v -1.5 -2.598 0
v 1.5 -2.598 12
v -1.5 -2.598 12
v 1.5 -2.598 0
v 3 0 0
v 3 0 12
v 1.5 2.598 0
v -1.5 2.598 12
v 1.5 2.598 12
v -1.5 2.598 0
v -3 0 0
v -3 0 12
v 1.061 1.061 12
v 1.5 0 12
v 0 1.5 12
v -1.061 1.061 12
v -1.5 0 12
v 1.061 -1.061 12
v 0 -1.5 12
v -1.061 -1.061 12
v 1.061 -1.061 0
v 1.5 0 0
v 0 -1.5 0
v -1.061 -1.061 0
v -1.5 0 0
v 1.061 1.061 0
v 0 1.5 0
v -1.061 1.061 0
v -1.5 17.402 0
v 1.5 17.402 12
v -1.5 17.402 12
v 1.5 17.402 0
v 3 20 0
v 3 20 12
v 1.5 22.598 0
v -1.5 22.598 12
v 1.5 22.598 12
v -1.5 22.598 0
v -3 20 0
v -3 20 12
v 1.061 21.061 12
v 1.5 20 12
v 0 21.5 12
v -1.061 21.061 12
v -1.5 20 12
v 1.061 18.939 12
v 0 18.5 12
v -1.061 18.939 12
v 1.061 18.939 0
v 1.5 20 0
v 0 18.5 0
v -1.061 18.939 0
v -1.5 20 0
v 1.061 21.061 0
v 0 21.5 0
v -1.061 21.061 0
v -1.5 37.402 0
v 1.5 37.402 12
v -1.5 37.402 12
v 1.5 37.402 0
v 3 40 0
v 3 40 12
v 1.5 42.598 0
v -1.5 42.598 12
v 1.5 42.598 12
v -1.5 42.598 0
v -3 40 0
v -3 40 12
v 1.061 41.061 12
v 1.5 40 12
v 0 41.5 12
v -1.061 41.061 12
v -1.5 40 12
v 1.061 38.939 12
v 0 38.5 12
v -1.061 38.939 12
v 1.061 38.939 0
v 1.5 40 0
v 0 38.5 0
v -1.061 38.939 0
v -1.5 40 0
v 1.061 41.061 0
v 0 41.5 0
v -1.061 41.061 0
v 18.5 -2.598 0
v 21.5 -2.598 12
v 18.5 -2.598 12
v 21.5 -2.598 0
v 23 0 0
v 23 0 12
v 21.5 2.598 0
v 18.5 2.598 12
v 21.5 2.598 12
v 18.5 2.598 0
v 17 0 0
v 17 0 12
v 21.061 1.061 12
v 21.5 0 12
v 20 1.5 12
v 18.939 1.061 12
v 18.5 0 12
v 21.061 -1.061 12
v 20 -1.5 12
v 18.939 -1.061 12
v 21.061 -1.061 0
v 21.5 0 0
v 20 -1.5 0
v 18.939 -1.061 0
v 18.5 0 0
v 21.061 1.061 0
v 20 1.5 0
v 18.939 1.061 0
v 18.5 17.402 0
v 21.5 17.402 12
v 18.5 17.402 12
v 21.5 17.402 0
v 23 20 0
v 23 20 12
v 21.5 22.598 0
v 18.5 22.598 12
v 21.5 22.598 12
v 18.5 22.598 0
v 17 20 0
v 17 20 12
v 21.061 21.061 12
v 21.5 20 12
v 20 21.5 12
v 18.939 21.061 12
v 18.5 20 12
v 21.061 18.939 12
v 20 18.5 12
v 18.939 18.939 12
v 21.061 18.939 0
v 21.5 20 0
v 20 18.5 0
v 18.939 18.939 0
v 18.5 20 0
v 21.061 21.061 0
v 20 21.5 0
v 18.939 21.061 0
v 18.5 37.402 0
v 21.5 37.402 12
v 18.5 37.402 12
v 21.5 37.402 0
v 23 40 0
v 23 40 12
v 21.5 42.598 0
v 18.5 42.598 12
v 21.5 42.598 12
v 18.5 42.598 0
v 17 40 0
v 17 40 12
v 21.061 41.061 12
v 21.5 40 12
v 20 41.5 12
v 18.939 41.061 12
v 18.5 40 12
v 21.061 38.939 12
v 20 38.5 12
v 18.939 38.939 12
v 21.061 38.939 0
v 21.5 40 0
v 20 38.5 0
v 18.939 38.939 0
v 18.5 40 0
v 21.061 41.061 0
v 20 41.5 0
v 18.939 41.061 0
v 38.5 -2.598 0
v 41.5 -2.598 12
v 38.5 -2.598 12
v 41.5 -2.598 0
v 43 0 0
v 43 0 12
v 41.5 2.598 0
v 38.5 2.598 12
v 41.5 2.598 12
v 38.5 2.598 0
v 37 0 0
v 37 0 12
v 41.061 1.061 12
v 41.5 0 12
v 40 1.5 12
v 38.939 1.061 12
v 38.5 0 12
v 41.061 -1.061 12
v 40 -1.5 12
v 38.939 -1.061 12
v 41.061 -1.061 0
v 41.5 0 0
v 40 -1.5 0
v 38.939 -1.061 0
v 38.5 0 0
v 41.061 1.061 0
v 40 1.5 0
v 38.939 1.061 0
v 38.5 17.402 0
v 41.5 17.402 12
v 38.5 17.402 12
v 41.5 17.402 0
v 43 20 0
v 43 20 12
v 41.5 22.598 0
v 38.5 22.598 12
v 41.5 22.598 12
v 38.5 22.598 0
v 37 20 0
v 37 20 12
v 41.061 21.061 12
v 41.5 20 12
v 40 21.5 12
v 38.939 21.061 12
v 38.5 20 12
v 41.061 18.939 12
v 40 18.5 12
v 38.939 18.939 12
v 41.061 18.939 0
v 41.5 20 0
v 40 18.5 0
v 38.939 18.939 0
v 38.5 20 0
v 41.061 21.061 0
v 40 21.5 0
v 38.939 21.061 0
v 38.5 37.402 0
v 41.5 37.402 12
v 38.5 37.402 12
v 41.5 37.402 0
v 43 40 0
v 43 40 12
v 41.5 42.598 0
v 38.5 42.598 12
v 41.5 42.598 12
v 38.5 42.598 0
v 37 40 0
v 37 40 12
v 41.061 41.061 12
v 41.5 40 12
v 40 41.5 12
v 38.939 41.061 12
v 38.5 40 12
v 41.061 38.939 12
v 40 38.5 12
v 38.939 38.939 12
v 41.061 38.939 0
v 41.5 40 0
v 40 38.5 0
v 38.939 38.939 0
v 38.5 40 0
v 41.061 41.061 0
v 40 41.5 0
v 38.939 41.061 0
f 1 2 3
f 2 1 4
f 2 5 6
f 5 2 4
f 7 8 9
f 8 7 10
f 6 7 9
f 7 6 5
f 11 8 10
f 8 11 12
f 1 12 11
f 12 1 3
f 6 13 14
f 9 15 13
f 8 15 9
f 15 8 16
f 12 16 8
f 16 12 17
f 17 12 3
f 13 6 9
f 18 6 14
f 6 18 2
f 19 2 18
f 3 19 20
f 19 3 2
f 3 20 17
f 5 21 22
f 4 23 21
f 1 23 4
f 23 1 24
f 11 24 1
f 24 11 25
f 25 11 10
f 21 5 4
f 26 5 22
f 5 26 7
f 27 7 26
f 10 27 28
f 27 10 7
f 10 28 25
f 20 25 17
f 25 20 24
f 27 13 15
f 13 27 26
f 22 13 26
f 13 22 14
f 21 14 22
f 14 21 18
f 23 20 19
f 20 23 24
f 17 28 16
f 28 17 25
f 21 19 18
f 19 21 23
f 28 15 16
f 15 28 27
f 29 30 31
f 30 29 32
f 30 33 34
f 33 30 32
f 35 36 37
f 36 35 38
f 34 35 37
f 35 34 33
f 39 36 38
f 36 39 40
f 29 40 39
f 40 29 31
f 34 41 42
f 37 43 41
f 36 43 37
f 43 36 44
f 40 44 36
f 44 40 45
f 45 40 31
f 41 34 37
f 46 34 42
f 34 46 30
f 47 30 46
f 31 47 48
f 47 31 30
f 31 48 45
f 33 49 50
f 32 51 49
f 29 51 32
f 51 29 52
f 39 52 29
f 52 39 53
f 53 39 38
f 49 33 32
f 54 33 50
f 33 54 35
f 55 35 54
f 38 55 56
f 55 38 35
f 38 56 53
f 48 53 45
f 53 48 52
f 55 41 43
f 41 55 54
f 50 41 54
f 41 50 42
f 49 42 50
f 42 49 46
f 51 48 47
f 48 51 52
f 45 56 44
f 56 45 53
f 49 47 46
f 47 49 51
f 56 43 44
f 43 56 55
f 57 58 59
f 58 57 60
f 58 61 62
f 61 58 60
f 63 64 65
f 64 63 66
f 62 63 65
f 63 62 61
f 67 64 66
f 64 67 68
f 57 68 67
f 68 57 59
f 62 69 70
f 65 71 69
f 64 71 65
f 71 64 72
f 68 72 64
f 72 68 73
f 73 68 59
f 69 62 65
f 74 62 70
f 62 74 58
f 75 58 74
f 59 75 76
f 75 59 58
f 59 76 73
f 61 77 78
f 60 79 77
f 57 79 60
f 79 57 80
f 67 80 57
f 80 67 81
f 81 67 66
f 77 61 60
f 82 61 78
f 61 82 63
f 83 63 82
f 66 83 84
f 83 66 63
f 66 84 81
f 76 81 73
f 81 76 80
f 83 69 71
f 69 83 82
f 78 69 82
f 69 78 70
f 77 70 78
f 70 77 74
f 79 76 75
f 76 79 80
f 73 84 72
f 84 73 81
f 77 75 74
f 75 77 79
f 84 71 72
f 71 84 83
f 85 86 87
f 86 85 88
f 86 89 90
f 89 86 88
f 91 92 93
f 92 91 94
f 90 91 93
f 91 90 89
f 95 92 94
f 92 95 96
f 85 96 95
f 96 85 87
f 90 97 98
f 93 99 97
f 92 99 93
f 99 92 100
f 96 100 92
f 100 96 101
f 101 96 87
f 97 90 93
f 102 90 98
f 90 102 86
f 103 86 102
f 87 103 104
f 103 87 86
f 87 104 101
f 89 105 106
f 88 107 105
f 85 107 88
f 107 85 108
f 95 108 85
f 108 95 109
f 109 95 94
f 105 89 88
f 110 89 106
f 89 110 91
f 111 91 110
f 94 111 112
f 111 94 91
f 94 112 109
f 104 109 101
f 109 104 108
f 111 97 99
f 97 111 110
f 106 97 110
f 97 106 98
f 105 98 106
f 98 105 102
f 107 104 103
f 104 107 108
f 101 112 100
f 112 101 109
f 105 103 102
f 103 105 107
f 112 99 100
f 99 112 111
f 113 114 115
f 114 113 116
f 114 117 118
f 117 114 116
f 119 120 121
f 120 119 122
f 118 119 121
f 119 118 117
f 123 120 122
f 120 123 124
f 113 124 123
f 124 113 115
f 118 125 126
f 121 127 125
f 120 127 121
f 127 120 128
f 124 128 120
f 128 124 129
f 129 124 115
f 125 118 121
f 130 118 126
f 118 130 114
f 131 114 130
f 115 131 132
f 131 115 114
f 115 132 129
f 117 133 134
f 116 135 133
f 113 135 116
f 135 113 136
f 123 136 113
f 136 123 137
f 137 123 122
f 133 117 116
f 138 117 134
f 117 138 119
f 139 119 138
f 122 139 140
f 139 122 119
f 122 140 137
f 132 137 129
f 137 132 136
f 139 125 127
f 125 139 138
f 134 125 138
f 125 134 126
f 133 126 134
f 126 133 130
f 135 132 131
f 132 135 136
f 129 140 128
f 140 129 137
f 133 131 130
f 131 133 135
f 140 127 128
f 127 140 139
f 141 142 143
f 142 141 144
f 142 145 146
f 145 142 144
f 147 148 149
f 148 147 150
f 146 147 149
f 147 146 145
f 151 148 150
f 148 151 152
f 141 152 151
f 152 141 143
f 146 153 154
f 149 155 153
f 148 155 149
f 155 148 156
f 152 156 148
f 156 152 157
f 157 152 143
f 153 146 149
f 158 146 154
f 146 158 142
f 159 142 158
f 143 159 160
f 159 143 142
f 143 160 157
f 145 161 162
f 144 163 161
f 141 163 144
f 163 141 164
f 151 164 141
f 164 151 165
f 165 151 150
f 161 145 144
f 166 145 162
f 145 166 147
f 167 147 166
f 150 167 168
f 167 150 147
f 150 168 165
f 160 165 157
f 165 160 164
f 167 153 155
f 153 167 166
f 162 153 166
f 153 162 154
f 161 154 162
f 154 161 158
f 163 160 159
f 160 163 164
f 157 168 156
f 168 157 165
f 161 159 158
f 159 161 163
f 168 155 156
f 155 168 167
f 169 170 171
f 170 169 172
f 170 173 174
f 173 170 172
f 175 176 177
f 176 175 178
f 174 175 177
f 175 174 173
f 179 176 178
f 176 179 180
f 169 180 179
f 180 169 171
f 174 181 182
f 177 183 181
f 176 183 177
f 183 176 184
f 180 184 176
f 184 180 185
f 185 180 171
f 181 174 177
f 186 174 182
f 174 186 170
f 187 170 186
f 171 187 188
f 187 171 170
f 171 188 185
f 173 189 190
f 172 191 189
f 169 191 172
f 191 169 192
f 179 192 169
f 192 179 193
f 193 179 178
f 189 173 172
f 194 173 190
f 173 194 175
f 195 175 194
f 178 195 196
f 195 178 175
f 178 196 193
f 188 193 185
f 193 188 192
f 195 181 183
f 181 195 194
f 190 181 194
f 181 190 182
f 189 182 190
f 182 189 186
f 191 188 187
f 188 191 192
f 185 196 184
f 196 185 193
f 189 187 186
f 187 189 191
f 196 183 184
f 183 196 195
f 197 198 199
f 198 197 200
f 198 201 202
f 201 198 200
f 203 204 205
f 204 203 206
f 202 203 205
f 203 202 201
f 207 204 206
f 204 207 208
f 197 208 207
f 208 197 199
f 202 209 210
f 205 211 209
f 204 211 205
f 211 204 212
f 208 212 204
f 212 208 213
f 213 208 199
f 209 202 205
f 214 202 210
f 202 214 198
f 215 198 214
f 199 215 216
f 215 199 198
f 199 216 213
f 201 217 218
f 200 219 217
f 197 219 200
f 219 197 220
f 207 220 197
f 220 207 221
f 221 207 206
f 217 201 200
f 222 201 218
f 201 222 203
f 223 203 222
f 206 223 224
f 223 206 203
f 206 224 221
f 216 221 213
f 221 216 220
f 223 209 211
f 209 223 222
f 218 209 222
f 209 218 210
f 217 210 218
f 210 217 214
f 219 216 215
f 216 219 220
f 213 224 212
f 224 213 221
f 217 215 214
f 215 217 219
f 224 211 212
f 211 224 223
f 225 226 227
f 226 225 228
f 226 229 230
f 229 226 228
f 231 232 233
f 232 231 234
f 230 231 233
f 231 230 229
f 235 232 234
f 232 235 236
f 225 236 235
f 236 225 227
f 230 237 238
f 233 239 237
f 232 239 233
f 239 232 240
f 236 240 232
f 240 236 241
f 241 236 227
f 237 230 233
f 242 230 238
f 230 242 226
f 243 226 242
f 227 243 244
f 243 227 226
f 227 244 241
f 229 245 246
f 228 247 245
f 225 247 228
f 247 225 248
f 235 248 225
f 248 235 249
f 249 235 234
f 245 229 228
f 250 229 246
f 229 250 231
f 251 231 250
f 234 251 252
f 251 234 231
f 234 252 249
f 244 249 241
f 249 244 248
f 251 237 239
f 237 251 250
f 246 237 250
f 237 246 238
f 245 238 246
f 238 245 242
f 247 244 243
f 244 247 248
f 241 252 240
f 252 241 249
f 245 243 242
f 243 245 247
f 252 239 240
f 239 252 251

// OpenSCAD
for(i =[0:2]) {
    for (j =[0:2])
        translate([i*20, j*20, 0])
        spacer();
} 

module spacer(){
    difference(){
        cylinder(12, 3, 3, $fn=6);
        translate([0,0,-1])
        cylinder(14, 1.5, 1.5, $fn=8);
    }
}
